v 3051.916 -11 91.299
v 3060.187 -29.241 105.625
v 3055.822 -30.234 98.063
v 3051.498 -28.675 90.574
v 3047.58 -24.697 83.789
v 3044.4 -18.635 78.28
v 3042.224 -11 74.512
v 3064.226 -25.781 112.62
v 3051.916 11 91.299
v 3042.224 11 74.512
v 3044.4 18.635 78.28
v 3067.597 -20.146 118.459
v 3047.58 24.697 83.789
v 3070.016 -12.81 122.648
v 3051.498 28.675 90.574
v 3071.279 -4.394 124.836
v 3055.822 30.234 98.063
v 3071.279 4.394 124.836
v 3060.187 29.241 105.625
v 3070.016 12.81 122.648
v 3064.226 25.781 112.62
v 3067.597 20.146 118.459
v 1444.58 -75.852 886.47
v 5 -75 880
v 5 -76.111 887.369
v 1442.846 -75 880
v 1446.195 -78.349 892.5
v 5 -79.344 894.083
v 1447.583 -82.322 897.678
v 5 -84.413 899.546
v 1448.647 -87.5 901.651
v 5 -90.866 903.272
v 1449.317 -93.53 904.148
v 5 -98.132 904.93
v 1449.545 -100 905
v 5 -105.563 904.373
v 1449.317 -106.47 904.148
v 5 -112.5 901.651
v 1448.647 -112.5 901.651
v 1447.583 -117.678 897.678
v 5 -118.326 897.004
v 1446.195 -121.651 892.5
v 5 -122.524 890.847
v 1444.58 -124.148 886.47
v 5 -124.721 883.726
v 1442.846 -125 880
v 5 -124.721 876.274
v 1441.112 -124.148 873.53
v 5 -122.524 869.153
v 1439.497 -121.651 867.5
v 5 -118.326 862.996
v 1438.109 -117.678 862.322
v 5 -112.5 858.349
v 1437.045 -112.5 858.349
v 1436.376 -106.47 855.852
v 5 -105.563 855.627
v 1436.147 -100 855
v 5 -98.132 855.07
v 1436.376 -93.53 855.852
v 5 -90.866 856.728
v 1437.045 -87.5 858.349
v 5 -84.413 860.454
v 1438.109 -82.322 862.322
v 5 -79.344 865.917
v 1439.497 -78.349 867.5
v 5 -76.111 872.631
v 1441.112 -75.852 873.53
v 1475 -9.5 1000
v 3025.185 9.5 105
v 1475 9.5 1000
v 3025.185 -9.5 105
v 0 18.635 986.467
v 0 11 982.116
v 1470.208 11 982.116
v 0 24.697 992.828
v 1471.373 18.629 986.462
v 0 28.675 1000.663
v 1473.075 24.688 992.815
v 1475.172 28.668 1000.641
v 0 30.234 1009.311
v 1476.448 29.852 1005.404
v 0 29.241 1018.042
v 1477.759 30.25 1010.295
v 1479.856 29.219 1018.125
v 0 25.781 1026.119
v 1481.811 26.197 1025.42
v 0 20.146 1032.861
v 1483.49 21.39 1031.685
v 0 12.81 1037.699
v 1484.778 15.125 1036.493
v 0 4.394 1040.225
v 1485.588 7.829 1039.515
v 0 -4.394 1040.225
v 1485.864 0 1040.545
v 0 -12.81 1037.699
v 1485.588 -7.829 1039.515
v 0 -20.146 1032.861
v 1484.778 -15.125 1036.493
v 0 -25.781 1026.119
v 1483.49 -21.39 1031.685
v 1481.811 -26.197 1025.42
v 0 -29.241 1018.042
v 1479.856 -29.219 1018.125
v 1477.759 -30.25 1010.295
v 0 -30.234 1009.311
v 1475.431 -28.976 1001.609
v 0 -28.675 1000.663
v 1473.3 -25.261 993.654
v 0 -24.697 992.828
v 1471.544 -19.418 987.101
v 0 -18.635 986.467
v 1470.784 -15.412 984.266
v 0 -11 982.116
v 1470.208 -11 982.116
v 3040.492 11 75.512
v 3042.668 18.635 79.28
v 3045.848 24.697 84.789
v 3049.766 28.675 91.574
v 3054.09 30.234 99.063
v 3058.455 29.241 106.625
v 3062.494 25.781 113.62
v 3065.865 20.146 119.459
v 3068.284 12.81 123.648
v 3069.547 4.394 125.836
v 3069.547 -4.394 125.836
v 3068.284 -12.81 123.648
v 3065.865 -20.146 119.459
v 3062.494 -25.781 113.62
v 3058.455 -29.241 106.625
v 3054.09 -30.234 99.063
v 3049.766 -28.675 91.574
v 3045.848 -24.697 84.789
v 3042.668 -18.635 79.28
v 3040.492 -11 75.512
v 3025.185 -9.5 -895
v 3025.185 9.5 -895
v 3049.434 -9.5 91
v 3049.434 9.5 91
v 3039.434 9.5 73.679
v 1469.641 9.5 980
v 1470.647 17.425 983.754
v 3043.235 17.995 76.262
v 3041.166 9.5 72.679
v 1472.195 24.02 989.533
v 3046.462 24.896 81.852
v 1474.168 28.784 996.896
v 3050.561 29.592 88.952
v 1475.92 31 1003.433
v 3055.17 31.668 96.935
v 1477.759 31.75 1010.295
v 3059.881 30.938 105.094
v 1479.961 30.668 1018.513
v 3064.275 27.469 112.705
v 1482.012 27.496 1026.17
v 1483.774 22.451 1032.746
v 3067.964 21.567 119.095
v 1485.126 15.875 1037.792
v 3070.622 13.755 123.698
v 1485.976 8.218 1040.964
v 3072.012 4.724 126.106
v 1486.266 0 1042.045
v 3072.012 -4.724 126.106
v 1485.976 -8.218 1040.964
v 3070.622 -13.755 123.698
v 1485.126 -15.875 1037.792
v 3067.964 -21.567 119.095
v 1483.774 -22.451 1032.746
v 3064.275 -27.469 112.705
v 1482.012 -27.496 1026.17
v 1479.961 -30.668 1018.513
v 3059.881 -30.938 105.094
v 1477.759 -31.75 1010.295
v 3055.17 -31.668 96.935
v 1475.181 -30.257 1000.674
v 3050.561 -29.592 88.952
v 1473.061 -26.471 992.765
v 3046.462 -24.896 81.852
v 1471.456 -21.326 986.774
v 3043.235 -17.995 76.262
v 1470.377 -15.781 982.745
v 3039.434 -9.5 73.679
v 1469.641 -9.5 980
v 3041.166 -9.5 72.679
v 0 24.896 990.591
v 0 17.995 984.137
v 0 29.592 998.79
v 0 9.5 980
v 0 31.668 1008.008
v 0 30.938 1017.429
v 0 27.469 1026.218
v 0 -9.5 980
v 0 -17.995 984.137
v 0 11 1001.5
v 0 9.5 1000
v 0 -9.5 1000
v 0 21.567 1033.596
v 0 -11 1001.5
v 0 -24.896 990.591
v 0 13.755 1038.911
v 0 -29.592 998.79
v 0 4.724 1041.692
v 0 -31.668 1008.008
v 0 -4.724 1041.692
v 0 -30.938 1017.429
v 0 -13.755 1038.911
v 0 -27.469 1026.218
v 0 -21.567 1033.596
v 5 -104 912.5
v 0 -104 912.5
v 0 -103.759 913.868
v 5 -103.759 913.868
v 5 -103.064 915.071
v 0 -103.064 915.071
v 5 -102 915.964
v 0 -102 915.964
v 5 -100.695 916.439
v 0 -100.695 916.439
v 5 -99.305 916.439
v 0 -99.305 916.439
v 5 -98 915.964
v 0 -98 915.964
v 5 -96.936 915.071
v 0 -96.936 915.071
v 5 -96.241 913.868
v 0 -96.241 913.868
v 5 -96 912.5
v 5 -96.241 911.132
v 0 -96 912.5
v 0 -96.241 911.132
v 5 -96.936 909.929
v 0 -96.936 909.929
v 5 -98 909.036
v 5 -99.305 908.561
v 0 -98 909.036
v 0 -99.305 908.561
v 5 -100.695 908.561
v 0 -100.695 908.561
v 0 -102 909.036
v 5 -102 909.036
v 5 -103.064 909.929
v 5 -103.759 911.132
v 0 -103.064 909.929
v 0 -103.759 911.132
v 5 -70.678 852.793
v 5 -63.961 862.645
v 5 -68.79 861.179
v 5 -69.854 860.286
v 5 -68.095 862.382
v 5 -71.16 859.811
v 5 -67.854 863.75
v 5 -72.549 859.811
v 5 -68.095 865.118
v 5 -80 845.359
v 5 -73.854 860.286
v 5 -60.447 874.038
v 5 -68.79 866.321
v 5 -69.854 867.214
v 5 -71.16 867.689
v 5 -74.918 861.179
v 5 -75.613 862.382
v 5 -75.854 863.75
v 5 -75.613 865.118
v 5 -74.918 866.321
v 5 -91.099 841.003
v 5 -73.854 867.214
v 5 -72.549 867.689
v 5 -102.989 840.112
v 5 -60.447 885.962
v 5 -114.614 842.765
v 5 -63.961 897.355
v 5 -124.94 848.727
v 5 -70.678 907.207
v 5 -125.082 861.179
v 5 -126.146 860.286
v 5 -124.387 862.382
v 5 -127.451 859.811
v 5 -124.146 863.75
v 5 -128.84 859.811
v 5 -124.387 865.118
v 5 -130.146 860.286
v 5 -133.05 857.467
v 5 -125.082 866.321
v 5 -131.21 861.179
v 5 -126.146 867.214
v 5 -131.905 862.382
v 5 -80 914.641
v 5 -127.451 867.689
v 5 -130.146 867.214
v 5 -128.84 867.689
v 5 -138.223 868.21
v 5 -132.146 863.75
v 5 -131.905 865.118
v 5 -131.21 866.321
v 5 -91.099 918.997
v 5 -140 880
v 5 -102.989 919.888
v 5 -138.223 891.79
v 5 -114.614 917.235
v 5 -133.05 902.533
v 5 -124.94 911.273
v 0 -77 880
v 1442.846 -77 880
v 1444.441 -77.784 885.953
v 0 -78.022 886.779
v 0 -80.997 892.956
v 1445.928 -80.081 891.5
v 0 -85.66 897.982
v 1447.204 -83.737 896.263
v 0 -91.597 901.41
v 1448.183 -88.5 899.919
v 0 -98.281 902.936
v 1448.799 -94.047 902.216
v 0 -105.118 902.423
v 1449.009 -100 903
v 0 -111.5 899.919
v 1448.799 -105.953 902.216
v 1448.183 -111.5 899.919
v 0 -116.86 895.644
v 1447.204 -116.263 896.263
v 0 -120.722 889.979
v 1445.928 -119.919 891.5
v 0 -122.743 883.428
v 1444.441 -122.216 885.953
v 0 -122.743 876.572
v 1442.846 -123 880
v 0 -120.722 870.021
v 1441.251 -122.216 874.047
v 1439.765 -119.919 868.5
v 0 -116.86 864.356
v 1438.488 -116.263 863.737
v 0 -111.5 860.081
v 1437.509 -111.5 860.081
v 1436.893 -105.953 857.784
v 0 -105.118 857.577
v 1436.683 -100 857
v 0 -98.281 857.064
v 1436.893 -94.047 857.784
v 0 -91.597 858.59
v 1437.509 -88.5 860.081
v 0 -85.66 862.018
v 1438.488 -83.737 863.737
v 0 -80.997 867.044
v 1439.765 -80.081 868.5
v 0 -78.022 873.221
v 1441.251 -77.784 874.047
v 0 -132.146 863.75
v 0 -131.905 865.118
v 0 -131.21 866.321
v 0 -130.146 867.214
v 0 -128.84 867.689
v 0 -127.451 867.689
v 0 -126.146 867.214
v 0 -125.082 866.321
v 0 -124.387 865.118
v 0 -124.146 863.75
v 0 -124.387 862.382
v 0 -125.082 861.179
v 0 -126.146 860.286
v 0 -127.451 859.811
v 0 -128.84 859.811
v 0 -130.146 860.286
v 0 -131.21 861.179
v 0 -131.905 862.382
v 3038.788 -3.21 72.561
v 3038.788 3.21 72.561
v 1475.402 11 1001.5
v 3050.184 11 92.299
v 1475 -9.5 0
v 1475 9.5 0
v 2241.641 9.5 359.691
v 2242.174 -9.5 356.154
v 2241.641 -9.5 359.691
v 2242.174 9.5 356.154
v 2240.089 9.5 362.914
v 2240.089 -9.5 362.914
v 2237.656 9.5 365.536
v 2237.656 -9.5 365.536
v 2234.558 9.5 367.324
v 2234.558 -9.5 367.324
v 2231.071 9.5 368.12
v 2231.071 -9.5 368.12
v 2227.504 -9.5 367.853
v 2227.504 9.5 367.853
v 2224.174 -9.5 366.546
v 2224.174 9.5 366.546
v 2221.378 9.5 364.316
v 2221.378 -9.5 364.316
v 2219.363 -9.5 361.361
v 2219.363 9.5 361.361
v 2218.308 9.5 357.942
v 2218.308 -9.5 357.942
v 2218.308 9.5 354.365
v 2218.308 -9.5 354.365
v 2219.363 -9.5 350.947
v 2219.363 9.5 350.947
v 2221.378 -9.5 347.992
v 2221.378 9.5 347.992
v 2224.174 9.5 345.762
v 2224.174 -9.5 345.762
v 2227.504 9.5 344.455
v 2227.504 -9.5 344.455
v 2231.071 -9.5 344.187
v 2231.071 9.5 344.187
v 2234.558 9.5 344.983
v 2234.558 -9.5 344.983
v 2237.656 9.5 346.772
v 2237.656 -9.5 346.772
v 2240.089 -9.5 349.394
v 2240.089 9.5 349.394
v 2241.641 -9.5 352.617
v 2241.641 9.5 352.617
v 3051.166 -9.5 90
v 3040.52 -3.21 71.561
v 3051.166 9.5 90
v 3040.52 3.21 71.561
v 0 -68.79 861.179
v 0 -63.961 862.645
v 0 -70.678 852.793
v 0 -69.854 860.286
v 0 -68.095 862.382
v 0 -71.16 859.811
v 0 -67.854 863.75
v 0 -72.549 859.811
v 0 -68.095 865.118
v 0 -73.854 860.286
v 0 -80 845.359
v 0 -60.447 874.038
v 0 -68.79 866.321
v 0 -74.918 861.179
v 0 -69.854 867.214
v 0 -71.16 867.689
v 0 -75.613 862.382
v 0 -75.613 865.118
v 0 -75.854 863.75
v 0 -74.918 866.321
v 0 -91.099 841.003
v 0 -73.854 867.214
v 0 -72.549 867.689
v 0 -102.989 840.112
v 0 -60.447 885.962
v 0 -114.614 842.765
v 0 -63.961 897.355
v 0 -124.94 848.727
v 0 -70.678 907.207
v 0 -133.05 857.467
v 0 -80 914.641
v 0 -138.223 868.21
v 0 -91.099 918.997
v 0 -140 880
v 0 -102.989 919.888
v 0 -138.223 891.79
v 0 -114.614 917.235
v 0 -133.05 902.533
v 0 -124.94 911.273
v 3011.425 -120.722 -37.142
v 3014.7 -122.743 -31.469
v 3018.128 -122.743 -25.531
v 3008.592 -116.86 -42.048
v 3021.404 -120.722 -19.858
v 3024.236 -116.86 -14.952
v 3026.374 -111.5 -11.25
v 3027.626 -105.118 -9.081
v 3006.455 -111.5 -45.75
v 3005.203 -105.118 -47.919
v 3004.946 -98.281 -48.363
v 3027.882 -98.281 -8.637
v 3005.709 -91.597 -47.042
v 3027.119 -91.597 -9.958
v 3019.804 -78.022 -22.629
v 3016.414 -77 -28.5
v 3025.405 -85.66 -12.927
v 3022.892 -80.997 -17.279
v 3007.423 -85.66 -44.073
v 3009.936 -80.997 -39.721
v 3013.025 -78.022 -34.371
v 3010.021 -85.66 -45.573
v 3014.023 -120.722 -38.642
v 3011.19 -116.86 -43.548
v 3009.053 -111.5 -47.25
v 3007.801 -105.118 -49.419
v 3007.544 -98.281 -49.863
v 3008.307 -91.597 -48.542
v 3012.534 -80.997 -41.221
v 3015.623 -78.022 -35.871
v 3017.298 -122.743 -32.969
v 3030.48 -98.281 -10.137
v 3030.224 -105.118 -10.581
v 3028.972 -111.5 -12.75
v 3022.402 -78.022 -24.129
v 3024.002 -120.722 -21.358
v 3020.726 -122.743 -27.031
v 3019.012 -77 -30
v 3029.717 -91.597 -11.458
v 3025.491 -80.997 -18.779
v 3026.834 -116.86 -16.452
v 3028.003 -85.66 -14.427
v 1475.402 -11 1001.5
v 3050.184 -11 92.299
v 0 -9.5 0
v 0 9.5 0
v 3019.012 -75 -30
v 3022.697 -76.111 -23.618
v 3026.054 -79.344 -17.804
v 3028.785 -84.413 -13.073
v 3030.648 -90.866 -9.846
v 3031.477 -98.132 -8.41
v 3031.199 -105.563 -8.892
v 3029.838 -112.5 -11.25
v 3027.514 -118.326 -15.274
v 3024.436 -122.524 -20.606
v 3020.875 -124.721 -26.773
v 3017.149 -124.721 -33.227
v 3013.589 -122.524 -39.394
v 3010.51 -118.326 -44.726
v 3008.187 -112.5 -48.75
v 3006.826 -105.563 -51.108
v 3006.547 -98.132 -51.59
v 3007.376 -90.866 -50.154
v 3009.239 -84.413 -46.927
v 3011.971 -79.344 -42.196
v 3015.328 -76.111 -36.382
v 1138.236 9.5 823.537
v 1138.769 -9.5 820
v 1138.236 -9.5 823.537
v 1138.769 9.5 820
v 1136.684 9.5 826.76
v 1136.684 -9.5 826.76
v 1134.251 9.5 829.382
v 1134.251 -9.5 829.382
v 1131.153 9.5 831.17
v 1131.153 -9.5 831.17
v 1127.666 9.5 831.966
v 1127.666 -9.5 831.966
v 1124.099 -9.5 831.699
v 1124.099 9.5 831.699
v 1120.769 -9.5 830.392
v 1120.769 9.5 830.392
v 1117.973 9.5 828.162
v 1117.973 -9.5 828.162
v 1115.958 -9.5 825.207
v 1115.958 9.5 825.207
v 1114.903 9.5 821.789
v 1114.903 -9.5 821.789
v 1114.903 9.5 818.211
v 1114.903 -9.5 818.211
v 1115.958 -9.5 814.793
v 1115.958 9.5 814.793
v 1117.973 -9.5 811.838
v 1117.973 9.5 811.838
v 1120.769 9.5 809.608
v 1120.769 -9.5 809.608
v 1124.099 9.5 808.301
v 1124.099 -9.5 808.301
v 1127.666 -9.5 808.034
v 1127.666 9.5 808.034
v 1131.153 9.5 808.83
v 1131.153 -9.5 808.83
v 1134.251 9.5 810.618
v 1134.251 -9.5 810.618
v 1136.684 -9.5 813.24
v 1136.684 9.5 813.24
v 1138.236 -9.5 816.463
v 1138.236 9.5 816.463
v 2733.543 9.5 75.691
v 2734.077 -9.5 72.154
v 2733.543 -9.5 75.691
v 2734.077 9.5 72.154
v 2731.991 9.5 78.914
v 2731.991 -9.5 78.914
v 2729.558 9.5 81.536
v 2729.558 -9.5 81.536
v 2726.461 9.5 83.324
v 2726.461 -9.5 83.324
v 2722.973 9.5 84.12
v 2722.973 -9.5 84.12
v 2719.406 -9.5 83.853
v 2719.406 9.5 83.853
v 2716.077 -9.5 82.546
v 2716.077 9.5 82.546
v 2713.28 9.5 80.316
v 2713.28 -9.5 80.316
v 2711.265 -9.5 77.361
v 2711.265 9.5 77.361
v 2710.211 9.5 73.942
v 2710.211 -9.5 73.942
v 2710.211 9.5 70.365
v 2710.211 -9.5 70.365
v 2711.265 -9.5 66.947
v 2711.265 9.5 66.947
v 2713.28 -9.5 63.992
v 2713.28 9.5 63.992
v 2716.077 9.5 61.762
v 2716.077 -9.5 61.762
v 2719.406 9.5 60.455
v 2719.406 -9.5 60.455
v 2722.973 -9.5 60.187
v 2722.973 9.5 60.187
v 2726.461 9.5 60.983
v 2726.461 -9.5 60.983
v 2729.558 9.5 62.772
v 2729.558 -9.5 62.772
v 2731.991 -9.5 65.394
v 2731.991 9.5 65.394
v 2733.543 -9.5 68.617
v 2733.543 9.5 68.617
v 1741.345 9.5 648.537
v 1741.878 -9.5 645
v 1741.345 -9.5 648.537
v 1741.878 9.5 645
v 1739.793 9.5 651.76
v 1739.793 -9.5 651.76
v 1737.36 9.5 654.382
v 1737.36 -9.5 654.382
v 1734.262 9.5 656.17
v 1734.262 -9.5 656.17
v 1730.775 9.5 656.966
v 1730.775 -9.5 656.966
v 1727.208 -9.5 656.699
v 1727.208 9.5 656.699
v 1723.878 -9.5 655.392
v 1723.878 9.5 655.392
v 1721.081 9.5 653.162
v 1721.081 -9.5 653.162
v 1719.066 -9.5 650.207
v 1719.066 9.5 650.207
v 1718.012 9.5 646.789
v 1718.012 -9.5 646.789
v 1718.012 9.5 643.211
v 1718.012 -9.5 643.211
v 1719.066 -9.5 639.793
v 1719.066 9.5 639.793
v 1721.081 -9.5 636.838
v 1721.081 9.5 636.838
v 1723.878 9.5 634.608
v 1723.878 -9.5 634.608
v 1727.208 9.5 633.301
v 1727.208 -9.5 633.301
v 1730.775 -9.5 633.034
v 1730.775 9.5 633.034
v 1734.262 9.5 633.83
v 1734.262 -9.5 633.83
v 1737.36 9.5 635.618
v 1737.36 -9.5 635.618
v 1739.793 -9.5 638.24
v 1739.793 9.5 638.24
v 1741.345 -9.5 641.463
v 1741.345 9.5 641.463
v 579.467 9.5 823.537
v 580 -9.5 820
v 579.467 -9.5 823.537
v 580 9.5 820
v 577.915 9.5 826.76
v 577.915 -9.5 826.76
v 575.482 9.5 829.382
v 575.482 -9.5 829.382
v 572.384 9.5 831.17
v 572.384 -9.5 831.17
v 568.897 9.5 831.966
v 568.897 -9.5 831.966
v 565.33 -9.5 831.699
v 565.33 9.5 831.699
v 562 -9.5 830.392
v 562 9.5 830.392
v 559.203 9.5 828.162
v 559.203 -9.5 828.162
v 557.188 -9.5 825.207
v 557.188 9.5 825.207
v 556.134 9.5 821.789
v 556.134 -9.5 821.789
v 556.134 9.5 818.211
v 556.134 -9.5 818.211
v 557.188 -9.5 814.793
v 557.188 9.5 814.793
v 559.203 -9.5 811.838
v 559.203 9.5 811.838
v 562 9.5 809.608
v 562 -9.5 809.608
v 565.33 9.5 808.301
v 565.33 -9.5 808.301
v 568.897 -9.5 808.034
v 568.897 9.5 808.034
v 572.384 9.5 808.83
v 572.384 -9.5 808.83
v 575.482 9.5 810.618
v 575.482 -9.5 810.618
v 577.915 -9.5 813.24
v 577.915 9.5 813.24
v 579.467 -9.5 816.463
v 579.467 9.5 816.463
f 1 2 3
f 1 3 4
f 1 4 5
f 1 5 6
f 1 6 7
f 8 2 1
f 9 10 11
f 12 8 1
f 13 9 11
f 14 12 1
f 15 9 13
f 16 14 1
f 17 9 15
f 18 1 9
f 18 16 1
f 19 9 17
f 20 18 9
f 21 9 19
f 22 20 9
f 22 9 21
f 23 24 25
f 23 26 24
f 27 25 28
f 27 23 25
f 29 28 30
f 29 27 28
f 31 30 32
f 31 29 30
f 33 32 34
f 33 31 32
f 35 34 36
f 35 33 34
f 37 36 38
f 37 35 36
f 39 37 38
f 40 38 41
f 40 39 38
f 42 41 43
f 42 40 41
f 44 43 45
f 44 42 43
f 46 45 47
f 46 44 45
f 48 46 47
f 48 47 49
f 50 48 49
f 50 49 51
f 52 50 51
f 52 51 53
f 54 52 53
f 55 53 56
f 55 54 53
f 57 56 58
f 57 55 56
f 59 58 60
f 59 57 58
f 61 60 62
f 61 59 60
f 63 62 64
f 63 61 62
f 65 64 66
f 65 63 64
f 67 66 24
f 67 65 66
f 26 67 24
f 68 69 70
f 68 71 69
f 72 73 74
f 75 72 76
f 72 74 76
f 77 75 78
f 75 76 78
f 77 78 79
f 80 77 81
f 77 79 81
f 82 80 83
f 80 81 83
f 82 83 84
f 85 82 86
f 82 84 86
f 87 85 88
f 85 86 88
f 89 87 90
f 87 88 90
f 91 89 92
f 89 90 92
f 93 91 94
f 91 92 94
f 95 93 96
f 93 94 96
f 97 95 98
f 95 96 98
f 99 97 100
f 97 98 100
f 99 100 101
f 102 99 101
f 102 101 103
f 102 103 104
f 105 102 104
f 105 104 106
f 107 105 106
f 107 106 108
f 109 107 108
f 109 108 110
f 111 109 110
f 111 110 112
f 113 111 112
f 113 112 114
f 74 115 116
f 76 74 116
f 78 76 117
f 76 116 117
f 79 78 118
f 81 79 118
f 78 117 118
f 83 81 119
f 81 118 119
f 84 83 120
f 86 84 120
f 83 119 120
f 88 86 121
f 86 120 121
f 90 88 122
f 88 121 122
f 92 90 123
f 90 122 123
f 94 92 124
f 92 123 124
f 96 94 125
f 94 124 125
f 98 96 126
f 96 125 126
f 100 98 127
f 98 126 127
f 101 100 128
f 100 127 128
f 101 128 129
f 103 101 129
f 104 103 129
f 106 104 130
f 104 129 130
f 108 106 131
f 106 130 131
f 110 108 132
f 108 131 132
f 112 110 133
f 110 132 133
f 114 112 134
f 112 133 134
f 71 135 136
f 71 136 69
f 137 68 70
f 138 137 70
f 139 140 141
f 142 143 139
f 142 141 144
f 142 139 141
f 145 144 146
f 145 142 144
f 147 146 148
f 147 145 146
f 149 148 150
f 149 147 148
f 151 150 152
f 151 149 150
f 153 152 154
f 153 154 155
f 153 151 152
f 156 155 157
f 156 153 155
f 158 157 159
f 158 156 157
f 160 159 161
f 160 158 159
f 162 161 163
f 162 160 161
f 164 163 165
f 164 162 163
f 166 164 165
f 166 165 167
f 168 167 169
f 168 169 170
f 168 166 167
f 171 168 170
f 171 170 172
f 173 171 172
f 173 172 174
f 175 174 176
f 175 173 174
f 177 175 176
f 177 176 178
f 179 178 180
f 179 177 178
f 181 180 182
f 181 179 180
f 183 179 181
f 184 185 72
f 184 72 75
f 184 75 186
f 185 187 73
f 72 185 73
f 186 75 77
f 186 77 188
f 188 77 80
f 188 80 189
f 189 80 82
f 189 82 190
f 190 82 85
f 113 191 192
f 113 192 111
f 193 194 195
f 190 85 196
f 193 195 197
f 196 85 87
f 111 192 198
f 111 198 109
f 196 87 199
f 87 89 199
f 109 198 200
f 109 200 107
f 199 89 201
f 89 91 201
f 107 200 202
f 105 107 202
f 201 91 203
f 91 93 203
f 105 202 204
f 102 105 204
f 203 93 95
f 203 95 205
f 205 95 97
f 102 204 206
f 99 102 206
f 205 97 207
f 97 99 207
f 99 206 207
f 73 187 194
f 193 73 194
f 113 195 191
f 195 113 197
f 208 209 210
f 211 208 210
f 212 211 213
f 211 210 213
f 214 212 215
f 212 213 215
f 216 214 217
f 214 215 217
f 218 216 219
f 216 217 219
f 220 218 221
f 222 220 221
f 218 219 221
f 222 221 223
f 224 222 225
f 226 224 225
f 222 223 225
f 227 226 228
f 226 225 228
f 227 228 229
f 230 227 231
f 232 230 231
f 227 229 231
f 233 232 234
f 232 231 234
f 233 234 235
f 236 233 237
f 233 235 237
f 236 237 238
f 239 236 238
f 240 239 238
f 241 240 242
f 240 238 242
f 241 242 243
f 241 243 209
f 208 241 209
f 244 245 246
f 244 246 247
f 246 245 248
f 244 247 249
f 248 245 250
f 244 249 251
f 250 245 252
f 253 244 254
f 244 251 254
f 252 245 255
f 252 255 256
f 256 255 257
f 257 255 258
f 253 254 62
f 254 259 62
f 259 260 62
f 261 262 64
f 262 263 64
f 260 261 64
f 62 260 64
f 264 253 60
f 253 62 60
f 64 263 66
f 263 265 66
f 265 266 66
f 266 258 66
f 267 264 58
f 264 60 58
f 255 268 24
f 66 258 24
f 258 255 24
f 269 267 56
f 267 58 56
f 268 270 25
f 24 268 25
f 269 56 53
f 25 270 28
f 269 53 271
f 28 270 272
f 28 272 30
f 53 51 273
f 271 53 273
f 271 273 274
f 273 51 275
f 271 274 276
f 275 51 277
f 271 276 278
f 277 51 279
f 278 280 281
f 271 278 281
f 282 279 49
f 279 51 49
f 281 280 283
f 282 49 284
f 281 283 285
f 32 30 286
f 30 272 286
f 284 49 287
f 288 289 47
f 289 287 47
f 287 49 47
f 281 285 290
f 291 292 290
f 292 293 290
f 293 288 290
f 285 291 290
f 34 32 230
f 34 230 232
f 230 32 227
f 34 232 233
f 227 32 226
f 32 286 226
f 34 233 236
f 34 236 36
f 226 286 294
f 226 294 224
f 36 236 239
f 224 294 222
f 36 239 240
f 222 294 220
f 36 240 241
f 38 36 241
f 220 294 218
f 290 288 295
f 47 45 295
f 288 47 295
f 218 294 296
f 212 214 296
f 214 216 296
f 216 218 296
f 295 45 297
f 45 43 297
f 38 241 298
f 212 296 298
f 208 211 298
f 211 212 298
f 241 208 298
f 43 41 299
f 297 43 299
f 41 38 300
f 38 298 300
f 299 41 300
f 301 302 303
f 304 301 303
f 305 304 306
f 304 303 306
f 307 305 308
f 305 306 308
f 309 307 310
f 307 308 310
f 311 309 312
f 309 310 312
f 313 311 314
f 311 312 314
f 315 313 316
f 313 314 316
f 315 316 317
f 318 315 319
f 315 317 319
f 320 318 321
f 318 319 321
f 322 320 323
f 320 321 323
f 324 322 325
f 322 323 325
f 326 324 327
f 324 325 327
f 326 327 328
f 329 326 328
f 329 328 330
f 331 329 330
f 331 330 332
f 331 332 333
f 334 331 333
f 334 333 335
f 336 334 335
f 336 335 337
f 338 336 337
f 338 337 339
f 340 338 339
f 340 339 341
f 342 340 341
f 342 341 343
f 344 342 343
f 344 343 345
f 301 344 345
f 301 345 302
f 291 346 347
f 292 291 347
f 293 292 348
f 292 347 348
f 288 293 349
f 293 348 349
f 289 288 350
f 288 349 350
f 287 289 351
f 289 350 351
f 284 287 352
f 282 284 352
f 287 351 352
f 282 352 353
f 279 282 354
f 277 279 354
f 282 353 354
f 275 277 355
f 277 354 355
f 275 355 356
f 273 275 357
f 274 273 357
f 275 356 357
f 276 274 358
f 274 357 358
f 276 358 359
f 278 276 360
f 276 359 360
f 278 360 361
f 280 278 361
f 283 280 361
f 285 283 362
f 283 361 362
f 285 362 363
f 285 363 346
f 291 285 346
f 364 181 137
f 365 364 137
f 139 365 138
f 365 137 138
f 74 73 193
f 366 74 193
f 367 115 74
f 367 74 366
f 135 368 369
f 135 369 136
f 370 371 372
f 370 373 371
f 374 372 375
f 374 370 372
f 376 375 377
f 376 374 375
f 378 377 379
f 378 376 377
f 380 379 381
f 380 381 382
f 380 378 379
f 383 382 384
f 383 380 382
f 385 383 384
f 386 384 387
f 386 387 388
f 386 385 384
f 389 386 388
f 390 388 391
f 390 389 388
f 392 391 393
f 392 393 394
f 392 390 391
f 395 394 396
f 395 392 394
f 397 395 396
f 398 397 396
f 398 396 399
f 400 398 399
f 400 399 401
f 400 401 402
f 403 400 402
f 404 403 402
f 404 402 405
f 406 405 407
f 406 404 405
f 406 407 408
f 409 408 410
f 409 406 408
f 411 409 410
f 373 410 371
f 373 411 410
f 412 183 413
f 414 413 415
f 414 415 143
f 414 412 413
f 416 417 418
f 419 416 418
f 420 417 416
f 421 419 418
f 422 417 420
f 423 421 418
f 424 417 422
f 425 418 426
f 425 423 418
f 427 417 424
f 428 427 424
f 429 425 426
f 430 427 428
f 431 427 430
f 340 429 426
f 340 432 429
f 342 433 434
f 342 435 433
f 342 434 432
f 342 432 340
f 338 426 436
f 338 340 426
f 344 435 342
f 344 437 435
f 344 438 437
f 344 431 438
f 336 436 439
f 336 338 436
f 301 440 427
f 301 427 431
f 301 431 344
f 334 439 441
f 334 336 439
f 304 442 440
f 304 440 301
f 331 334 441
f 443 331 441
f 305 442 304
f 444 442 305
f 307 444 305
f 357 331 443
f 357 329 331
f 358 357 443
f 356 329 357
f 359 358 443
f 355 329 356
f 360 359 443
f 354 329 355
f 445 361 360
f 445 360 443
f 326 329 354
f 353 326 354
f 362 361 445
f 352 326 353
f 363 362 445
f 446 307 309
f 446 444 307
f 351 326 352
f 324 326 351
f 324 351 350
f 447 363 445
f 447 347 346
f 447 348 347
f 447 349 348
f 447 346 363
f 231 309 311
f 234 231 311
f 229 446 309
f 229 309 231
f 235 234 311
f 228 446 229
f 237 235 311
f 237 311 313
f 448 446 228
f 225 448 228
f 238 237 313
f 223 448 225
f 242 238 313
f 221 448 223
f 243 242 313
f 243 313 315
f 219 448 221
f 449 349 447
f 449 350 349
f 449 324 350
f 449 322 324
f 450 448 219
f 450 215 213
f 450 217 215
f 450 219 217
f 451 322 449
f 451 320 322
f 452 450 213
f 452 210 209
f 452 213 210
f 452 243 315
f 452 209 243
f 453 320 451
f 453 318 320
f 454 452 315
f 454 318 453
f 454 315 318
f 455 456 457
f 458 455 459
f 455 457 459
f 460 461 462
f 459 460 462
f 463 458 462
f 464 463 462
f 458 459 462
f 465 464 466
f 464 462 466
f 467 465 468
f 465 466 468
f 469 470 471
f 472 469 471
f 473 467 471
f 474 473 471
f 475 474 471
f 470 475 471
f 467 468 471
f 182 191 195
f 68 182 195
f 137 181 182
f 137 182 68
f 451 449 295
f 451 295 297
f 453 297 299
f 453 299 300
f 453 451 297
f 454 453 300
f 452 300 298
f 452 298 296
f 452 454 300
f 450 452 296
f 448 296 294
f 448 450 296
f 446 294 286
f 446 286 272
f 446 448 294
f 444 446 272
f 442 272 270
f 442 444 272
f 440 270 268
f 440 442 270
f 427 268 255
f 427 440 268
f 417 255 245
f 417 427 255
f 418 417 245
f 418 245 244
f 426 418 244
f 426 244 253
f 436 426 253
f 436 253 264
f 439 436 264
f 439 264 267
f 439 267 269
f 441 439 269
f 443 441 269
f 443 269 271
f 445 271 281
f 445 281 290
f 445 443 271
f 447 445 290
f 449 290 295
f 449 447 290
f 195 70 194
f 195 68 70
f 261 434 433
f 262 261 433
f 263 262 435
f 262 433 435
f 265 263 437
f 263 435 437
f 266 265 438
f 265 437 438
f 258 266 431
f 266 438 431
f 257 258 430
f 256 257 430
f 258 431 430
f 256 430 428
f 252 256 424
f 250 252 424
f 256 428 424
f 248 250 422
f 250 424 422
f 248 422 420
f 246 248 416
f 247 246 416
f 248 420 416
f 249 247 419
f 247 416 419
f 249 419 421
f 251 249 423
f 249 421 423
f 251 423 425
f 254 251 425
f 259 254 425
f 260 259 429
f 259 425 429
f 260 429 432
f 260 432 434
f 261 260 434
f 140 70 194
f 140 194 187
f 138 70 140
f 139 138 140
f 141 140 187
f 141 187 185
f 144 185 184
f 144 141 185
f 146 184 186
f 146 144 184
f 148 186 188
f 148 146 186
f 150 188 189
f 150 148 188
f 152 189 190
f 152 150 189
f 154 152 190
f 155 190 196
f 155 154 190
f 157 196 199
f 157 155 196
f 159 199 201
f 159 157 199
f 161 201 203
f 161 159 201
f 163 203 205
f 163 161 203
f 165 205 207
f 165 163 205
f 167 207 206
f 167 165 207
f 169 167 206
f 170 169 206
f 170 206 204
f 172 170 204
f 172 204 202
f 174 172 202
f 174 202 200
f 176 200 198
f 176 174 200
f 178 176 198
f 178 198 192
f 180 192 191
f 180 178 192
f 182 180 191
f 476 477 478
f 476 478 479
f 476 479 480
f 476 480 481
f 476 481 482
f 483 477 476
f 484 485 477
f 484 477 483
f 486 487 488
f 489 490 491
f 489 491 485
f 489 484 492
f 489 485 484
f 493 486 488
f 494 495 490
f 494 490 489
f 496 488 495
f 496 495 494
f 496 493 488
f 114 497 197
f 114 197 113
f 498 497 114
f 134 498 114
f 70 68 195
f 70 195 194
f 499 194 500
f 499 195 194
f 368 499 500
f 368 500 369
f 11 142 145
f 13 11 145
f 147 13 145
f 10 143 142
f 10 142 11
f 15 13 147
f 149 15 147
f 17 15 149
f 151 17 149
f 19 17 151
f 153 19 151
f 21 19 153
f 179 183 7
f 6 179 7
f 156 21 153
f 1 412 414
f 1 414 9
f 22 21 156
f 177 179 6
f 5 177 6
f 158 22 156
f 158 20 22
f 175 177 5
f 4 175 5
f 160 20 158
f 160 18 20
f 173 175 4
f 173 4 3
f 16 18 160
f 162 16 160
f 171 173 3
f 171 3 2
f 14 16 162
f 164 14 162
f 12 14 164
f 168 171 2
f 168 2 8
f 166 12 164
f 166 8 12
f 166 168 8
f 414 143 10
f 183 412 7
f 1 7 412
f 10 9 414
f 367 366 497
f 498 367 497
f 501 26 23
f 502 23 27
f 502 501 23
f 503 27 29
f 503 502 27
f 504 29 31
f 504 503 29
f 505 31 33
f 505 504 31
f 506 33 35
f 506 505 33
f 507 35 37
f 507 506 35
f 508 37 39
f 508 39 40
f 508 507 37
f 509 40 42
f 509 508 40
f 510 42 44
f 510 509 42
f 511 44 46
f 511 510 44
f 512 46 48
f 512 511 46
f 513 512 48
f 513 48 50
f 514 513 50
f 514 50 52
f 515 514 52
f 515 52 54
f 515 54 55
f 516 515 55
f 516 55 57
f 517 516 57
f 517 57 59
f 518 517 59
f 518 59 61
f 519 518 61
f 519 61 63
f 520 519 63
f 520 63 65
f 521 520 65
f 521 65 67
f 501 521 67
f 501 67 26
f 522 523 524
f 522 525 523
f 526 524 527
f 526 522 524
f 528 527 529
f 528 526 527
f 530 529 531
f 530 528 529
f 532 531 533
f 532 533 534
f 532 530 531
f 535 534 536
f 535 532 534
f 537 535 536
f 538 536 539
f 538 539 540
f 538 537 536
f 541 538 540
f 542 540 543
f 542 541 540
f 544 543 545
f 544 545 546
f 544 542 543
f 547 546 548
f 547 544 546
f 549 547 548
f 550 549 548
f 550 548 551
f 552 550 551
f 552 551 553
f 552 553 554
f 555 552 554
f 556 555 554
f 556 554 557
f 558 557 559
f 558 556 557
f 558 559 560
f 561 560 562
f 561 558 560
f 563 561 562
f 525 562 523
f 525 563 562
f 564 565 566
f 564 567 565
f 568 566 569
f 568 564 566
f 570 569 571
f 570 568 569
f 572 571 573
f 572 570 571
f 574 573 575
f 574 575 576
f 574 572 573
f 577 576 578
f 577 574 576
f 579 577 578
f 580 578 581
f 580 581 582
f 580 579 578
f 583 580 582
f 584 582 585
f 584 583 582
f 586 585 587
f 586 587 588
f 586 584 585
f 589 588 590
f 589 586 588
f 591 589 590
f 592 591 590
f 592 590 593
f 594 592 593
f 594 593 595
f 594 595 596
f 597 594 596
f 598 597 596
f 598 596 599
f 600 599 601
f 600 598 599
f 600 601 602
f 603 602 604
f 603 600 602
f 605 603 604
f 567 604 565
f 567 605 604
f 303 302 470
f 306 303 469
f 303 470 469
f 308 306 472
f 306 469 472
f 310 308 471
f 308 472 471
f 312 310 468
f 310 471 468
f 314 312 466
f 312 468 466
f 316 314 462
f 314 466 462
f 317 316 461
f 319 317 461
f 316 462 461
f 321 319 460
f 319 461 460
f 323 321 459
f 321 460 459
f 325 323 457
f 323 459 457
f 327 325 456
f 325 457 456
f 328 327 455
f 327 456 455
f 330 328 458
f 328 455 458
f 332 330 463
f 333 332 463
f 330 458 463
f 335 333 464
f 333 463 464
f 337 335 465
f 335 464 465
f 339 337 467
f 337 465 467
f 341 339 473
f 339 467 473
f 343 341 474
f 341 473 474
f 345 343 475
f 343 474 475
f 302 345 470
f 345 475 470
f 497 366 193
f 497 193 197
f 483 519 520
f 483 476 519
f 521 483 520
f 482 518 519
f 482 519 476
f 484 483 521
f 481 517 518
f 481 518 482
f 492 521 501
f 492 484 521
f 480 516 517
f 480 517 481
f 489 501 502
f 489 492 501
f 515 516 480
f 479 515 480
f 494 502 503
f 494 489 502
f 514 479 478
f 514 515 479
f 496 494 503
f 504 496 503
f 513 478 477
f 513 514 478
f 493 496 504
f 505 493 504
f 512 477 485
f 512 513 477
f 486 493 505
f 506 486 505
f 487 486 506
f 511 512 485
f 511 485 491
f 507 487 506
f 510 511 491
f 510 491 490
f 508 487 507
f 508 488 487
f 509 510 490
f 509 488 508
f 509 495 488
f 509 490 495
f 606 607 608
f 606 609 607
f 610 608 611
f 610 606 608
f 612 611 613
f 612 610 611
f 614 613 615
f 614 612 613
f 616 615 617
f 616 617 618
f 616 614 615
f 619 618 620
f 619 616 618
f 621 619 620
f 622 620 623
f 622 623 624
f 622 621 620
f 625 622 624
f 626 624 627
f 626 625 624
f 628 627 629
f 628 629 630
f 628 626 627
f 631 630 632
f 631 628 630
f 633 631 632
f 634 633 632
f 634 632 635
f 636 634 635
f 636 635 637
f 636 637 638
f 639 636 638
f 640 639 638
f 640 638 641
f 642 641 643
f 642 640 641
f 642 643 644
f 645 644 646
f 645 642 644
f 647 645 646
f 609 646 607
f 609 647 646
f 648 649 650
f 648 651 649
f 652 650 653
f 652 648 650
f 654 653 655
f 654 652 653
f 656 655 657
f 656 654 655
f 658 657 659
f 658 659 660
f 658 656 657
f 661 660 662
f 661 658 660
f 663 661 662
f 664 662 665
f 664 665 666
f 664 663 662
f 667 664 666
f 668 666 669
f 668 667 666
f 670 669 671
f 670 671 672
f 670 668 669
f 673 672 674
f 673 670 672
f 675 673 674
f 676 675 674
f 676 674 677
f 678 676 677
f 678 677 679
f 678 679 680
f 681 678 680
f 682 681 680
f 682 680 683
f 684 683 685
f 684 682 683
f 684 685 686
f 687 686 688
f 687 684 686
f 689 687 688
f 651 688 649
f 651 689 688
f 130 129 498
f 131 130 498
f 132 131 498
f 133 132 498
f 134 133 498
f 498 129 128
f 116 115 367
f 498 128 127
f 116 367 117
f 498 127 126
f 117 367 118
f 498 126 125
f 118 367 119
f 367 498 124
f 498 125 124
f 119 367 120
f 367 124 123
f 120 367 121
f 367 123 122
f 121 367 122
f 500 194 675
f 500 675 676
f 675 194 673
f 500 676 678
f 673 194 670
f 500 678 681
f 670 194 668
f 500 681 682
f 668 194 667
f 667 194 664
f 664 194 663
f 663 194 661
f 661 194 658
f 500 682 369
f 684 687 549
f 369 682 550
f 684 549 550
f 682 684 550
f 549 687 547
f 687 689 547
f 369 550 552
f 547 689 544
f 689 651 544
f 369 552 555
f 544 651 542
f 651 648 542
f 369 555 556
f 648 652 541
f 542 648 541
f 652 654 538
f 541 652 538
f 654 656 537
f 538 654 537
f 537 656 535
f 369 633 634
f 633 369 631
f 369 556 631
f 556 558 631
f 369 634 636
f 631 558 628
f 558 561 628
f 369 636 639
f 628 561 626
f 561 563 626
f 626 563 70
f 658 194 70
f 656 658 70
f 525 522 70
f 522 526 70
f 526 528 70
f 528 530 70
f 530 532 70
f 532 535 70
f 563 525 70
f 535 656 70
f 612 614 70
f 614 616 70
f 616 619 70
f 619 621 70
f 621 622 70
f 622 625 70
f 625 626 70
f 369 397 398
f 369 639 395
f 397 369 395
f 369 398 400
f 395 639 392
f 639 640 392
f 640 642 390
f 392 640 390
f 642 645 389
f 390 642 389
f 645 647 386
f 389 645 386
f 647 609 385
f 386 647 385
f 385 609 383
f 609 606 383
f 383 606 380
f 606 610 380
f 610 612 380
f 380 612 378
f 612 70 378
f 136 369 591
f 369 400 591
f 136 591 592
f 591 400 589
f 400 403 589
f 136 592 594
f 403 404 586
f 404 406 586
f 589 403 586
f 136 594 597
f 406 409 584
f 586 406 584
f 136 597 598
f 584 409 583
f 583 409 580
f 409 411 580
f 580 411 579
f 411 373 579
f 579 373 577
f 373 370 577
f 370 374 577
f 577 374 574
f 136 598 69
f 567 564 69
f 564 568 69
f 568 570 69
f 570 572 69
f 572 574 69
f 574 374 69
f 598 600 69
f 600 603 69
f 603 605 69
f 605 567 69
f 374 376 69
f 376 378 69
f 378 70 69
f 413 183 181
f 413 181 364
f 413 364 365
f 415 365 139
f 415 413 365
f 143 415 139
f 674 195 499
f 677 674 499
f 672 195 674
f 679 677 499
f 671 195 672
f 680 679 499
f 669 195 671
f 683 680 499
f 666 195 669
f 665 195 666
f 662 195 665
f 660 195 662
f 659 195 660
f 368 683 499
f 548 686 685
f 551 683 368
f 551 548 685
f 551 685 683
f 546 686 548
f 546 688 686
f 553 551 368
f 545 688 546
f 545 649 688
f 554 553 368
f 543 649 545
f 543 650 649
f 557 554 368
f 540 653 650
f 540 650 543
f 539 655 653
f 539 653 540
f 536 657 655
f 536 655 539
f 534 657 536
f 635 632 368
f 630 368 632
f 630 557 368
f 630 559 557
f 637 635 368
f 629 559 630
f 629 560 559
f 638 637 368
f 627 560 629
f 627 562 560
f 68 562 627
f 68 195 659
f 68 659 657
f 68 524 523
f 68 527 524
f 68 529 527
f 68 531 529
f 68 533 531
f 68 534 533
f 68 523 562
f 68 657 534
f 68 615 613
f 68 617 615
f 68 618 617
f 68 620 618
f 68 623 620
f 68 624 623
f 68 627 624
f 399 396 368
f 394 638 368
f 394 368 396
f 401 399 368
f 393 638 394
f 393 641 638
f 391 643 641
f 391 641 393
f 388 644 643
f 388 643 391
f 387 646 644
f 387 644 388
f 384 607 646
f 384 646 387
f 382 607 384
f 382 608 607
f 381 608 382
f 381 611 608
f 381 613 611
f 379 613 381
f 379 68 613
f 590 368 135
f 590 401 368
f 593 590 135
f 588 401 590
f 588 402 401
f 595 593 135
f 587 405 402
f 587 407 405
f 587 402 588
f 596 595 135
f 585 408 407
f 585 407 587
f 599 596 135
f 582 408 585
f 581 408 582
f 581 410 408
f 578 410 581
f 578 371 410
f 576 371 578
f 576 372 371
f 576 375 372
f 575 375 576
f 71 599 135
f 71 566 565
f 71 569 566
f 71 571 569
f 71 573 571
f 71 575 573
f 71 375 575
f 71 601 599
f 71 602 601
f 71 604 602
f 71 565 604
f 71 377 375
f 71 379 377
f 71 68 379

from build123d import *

# Parameters (mm, degrees)
F0_R      = 12
F1_DEPTH  = 9.5
F5_R      = 31.75
F6_DEPTH  = 2
F9_R      = 25
F9_R_2    = 23
F12_R     = 25
F13_DEPTH = 3
F14_R     = 40
F14_R_2   = 4
F14_R_3   = 25
F15_DEPTH = 5


with BuildPart() as f1:
    # F0 (on Front) → F1 (new body, symmetric)
    with BuildSketch(Plane.XZ):
        Polygon((0, 1000), (0, 0), (1475, 0), (3025.1854727741, -895), (3025.1854727741, 105), (1475, 1000), align=None)
        with Locations((568, 820)):
            Circle(F0_R, mode=Mode.SUBTRACT)
        with Locations((1126.7691453624, 820)):
            Circle(F0_R, mode=Mode.SUBTRACT)
        with Locations((2230.1741521, 356.1539030917)):
            Circle(F0_R, mode=Mode.SUBTRACT)
        with Locations((2722.0765814496, 72.1539030917)):
            Circle(F0_R, mode=Mode.SUBTRACT)
        with Locations((1729.878036687, 645)):
            Circle(F0_R, mode=Mode.SUBTRACT)
    extrude(amount=F1_DEPTH, both=True)


with BuildPart() as f4:
    # F4: sweep along a path in F2
    with BuildLine(Plane.XZ) as f4_path:
        Line((0, 1000), (1475, 1000))
        Line((1475, 1000), (3051.1662348877, 90))
    # F3 (on Right) → F4 (sweep)
    with BuildSketch(Plane.YZ):
        with BuildLine():
            Line((9.5, 1000), (9.5, 980))
            ThreePointArc((9.5, 980), (0, 1042.045420446), (-9.5, 980))
            Line((-9.5, 980), (-9.5, 1000))
            Line((-9.5, 1000), (9.5, 1000))
        make_face()
        with BuildLine():
            ThreePointArc((-11, 982.1163058396), (0, 1040.545420446), (11, 982.1163058396))
            Line((11, 982.1163058396), (11, 1001.5))
            Line((11, 1001.5), (-11, 1001.5))
            Line((-11, 1001.5), (-11, 982.1163058396))
        make_face(mode=Mode.SUBTRACT)
    sweep(path=f4_path.line, transition=Transition.RIGHT)

    # F5 (on face) → F6 (join)
    with BuildSketch(Plane(origin=(2249.4035329955, 0, -1298.693735291), x_dir=(0, 1, 0), z_dir=(0.8660254038, 0, -0.5))):
        with Locations((0, 1613.8208242304)):
            Circle(F5_R)
    extrude(amount=-F6_DEPTH)


with BuildPart() as f10:
    # F10: sweep along a path in F8
    with BuildLine(Plane.XZ.offset(100)) as f10_path:
        Line((0, 880), (1442.8460969083, 880))
        Line((1442.8460969083, 880), (3019.0123317959, -30))
    # F9 (on Right) → F10 (sweep)
    with BuildSketch(Plane.YZ):
        with Locations((-100, 880)):
            Circle(F9_R)
        with Locations((-100, 880)):
            Circle(F9_R_2, mode=Mode.SUBTRACT)
    sweep(path=f10_path.line, transition=Transition.RIGHT)

    # F12 (on face) → F13 (join)
    with BuildSketch(Plane(origin=(2277.2496299037, 0, -1314.7706868369), x_dir=(0, 1, 0), z_dir=(0.8660254038, 0, -0.5))):
        with Locations((-100, 1483.5254037844)):
            Circle(F12_R)
    extrude(amount=-F13_DEPTH)

    # F14 (on face) → F15 (join)
    with BuildSketch(Plane(origin=(0, 0, 0), x_dir=(0, -1, 0), z_dir=(-1, 0, 0))):
        with Locations((100, 880)):
            Circle(F14_R)
        with Locations((71.854174377, 863.75)):
            Circle(F14_R_2, mode=Mode.SUBTRACT)
        with Locations((128.145825623, 863.75)):
            Circle(F14_R_2, mode=Mode.SUBTRACT)
        with Locations((100, 880)):
            Circle(F14_R_3, mode=Mode.SUBTRACT)
        with Locations((100, 912.5)):
            Circle(F14_R_2, mode=Mode.SUBTRACT)
    extrude(amount=-F15_DEPTH)


solid = Compound([f1.part, f4.part, f10.part])
